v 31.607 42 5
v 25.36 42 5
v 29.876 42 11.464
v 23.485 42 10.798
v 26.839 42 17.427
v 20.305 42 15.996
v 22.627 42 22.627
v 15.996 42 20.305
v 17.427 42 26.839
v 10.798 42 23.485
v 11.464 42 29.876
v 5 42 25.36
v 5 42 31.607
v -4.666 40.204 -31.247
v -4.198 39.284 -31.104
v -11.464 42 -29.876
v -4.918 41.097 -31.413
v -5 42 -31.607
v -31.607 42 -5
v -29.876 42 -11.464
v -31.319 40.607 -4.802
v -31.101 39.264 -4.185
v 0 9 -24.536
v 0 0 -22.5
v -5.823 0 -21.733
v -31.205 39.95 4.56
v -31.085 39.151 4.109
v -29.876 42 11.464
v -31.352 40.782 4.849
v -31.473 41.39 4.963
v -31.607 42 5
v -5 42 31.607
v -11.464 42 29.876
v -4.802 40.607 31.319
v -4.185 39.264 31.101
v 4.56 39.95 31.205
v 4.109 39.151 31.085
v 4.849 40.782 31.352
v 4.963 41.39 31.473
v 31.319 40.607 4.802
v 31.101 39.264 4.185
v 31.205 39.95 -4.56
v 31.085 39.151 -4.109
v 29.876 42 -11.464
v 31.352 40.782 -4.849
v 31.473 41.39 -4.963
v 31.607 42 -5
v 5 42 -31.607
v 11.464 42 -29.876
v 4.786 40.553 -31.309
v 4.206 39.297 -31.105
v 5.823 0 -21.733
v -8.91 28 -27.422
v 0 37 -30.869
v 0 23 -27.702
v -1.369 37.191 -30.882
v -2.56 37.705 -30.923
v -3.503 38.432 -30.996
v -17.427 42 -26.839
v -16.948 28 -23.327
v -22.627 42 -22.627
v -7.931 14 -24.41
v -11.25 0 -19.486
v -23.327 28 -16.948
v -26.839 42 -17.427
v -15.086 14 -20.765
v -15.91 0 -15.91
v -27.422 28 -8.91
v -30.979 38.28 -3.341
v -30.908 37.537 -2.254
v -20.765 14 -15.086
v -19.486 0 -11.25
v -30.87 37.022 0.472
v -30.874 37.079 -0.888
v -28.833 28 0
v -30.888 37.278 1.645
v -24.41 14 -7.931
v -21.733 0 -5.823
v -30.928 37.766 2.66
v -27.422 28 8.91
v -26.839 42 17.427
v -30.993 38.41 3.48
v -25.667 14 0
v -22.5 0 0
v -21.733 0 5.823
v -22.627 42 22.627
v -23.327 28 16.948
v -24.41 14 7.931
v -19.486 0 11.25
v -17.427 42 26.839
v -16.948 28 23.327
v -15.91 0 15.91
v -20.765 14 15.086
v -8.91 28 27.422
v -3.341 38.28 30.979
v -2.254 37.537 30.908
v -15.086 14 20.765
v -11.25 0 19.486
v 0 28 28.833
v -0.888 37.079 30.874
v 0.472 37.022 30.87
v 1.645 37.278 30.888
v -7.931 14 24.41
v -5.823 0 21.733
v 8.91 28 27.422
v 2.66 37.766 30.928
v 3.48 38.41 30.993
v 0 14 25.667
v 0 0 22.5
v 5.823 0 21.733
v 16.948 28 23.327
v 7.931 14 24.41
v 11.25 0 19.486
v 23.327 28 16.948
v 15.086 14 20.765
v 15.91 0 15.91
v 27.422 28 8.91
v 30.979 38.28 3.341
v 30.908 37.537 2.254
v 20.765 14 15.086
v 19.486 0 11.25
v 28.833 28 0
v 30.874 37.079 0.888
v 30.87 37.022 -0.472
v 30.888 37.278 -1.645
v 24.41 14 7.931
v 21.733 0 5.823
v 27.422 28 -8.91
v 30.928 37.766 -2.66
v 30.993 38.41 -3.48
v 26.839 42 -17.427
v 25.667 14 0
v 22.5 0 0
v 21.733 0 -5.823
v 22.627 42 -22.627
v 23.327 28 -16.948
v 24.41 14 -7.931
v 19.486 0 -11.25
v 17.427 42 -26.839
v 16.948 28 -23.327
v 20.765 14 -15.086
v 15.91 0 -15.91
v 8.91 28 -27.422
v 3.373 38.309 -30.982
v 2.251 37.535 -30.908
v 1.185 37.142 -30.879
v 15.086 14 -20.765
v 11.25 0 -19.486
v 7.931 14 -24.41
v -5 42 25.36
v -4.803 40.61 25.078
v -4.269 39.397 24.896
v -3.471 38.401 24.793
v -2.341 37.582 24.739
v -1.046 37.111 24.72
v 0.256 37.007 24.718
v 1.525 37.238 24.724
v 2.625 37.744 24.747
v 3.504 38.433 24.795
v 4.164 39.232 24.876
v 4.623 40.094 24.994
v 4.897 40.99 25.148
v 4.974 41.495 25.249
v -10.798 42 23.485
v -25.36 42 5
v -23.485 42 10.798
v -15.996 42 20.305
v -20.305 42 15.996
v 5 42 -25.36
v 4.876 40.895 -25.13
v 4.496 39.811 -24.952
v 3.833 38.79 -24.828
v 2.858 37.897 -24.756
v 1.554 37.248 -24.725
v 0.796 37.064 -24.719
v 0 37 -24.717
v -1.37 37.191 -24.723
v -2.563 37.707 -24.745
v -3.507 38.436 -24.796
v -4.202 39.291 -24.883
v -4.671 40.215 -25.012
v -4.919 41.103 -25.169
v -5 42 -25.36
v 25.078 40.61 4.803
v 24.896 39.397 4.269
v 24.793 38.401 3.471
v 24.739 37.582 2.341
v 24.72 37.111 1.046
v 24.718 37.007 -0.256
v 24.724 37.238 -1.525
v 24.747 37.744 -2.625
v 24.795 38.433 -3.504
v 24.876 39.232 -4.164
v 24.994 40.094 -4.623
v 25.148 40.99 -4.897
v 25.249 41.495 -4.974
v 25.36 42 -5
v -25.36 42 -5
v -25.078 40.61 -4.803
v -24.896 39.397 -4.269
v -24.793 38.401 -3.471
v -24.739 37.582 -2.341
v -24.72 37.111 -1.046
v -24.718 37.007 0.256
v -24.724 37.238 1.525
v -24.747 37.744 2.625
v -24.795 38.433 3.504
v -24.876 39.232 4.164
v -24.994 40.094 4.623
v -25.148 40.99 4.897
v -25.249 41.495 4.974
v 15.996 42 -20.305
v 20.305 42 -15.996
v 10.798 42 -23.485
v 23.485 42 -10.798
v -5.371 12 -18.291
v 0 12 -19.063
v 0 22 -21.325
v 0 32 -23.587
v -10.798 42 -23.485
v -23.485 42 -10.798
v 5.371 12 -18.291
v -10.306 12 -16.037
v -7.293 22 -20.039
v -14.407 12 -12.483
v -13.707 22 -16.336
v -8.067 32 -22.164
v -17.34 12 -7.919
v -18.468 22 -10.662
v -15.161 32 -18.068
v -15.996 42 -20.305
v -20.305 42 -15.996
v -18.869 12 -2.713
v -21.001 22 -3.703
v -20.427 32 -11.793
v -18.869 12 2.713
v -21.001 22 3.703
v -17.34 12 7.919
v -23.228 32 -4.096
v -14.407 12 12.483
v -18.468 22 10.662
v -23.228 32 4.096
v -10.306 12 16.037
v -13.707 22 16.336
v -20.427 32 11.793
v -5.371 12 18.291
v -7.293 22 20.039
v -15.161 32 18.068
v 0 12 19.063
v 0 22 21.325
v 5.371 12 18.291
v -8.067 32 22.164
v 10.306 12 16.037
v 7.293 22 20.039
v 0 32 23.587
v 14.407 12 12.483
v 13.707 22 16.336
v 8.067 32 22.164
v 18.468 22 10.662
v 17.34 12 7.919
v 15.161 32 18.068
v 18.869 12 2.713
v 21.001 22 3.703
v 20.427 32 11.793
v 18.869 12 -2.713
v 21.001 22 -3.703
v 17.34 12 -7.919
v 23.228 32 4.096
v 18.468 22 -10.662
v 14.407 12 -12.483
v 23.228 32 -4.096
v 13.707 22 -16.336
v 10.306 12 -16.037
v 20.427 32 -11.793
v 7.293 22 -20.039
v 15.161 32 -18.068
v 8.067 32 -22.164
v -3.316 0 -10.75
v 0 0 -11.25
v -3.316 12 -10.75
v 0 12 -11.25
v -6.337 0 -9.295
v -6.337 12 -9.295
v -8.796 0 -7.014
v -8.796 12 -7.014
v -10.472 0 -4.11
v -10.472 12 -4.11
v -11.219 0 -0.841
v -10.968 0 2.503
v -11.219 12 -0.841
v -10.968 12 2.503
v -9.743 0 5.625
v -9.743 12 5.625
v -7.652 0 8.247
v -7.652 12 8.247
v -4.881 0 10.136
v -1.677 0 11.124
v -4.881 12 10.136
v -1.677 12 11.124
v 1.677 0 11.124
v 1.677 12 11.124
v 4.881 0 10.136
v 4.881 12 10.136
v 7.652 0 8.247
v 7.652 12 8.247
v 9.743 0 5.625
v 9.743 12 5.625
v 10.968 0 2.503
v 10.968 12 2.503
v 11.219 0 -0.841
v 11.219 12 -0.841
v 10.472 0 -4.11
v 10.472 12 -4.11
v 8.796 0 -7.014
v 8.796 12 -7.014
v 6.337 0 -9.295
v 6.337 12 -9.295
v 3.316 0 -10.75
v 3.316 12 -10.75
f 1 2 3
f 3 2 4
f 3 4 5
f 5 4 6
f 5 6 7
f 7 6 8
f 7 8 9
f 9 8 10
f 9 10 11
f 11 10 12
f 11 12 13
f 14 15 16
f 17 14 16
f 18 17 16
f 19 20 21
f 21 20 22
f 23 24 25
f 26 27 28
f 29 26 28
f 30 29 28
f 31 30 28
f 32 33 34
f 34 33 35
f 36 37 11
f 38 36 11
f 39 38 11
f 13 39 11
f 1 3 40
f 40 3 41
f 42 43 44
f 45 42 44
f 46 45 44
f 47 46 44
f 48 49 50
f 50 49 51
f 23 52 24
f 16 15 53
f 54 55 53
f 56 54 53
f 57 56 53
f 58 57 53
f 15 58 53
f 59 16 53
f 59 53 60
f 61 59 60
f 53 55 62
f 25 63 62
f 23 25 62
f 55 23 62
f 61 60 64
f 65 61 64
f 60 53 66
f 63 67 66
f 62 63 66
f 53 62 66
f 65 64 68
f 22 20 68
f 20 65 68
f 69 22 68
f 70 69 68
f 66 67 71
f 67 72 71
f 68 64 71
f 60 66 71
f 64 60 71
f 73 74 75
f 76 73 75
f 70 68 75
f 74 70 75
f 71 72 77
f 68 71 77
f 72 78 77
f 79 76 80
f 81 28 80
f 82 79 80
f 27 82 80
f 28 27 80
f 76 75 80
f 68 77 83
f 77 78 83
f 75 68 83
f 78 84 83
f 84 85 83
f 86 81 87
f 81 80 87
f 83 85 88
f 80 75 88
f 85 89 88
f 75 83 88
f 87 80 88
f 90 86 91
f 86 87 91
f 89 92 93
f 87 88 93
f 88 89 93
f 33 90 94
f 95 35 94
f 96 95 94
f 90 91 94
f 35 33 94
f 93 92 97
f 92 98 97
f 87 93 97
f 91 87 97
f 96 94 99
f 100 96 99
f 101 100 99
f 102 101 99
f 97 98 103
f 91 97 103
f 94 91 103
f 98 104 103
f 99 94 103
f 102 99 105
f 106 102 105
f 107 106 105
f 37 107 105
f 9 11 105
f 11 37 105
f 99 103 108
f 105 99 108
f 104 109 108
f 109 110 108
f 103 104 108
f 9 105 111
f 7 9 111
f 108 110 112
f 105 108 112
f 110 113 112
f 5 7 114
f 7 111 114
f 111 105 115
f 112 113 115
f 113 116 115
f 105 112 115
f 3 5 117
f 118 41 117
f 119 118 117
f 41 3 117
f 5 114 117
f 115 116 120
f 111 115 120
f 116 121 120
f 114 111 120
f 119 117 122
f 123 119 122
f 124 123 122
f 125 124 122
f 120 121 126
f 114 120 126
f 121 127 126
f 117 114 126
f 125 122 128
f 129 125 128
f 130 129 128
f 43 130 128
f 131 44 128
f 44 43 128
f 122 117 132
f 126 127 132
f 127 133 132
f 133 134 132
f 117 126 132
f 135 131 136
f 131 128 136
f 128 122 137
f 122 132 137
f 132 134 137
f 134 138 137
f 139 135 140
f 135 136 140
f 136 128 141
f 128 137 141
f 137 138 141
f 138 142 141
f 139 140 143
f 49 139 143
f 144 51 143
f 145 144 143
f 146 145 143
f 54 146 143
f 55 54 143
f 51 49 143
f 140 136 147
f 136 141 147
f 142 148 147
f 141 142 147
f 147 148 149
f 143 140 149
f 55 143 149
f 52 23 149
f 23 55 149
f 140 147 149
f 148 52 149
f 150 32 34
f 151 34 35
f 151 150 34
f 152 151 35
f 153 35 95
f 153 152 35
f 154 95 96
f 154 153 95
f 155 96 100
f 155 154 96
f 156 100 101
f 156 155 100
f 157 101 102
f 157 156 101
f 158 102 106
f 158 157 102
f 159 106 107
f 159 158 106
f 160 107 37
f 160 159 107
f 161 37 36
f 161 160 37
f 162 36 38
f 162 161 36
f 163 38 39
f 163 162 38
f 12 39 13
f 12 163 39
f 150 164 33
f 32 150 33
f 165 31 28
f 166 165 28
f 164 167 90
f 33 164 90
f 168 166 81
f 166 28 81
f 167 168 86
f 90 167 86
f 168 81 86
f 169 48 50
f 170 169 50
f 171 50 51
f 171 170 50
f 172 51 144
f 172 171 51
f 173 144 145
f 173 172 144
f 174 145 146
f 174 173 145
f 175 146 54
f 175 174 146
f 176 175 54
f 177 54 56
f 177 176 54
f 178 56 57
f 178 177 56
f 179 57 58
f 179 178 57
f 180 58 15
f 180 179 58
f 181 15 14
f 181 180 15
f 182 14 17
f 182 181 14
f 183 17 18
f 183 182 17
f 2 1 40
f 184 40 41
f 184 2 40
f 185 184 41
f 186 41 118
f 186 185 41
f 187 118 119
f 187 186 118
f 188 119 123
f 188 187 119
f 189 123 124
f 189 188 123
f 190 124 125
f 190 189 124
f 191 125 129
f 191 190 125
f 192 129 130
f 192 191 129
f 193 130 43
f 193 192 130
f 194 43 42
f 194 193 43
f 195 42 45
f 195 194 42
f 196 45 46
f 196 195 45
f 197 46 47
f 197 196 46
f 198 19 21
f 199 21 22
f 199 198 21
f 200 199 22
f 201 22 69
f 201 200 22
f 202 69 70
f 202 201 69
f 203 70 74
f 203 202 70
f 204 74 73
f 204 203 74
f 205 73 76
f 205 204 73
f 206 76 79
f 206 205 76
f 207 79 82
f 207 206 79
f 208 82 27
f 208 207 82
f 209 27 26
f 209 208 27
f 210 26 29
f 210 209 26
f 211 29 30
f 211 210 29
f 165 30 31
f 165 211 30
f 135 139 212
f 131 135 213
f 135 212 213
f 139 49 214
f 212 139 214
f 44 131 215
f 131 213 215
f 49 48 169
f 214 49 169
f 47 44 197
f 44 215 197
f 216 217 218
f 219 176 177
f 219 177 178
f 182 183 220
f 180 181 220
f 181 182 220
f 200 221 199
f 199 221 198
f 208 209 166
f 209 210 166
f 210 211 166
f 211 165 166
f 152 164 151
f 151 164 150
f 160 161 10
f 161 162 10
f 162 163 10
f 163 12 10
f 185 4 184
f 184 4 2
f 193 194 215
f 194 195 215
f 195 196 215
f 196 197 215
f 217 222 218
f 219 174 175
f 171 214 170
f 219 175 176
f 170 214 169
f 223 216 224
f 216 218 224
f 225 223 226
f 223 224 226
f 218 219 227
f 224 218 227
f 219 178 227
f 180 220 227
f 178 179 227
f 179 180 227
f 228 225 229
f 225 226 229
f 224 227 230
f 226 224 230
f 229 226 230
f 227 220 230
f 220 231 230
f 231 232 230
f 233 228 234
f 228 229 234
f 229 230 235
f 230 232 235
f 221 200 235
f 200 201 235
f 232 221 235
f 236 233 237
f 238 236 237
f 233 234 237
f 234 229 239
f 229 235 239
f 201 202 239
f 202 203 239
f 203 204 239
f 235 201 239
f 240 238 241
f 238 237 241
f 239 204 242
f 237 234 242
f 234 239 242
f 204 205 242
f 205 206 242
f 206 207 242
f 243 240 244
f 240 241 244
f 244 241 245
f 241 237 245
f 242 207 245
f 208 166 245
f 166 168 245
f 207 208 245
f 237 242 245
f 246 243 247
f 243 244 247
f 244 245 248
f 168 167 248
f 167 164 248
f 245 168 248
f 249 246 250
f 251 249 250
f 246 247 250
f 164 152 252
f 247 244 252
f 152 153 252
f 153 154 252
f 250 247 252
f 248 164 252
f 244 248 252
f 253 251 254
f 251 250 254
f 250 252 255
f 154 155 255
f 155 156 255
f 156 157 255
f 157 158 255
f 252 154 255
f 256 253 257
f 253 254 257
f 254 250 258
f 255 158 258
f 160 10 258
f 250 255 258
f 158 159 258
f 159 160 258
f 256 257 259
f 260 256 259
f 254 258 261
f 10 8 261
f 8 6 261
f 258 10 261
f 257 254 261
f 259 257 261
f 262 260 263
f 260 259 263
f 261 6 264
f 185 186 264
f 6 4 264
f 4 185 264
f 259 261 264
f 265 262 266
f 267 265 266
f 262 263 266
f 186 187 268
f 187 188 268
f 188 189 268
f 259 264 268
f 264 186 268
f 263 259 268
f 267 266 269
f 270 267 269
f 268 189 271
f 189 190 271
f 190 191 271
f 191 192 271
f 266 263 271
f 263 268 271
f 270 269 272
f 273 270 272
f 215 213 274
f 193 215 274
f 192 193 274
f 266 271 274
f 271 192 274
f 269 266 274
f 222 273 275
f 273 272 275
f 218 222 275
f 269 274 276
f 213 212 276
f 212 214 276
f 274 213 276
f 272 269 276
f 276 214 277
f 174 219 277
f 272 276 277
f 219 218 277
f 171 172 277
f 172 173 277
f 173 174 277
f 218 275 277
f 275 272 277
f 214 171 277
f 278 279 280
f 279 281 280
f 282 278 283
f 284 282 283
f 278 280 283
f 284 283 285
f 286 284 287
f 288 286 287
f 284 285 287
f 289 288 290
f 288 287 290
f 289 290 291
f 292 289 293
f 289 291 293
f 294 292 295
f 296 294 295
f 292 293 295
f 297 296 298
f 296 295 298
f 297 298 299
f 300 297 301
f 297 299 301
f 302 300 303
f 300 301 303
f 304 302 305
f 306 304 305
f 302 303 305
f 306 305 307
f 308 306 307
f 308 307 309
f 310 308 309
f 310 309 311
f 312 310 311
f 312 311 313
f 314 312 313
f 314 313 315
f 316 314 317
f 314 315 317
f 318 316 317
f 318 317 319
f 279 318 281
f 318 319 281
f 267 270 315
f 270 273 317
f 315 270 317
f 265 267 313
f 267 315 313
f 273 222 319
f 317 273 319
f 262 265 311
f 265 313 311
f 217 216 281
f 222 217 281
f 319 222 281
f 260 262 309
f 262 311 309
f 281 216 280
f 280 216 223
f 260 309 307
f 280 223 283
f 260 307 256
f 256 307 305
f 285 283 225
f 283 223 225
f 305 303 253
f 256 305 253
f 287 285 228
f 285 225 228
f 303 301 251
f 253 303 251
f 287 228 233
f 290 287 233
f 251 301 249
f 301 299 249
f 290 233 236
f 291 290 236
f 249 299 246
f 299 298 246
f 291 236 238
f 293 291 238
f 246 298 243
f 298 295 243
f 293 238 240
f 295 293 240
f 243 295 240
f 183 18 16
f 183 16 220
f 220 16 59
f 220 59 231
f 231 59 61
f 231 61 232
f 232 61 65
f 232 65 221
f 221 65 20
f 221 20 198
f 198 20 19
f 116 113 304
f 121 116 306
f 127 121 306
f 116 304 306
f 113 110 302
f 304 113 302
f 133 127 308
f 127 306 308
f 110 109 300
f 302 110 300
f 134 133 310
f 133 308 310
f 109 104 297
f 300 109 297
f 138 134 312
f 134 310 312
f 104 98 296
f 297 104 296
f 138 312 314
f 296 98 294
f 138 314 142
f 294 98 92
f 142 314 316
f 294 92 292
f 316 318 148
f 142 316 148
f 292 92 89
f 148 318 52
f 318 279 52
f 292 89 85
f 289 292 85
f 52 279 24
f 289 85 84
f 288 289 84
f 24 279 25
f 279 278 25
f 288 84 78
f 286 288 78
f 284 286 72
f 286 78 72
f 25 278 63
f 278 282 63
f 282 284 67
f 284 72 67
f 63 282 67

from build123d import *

# Parameters (mm, degrees)
CUT_EXTRUDE1_START = -10
CUT_EXTRUDE1_DEPTH = 72.741396162
CIRPATTERN1_COUNT  = 4


with BuildPart() as part:
    # Sketch1 → Revolve1 (revolve)
    with BuildSketch(Plane.XY, mode=Mode.PRIVATE) as revolve1_sk:
        Polygon((11.25, 0), (11.25, 12), (19.062713823, 12), (25.848428109, 42), (32, 42), (22.5, 0), align=None)
    revolve(revolve1_sk.sketch.rotate(Axis((0, 0, 0), (0, 1, 0)), 90), axis=Axis((0, 0, 0), (0, 1, 0)))

    # Sketch2 → Cut-Extrude1 (cut)
    with BuildSketch(Plane.XY.offset(CUT_EXTRUDE1_START)):
        with BuildLine():
            Line((5, 42), (-5, 42))
            ThreePointArc((-5, 42), (0, 37), (5, 42))
        make_face()
    cut_extrude1 = extrude(amount=CUT_EXTRUDE1_DEPTH, mode=Mode.SUBTRACT)

    # CirPattern1: Cut-Extrude1 ×4 about axis
    cirpattern1_axis = Axis((0, 42, 0), (0, -1, 0))
    for i in range(1, CIRPATTERN1_COUNT):
        add(cut_extrude1.rotate(cirpattern1_axis, i * 360 / CIRPATTERN1_COUNT), mode=Mode.SUBTRACT)


solid = part.part
